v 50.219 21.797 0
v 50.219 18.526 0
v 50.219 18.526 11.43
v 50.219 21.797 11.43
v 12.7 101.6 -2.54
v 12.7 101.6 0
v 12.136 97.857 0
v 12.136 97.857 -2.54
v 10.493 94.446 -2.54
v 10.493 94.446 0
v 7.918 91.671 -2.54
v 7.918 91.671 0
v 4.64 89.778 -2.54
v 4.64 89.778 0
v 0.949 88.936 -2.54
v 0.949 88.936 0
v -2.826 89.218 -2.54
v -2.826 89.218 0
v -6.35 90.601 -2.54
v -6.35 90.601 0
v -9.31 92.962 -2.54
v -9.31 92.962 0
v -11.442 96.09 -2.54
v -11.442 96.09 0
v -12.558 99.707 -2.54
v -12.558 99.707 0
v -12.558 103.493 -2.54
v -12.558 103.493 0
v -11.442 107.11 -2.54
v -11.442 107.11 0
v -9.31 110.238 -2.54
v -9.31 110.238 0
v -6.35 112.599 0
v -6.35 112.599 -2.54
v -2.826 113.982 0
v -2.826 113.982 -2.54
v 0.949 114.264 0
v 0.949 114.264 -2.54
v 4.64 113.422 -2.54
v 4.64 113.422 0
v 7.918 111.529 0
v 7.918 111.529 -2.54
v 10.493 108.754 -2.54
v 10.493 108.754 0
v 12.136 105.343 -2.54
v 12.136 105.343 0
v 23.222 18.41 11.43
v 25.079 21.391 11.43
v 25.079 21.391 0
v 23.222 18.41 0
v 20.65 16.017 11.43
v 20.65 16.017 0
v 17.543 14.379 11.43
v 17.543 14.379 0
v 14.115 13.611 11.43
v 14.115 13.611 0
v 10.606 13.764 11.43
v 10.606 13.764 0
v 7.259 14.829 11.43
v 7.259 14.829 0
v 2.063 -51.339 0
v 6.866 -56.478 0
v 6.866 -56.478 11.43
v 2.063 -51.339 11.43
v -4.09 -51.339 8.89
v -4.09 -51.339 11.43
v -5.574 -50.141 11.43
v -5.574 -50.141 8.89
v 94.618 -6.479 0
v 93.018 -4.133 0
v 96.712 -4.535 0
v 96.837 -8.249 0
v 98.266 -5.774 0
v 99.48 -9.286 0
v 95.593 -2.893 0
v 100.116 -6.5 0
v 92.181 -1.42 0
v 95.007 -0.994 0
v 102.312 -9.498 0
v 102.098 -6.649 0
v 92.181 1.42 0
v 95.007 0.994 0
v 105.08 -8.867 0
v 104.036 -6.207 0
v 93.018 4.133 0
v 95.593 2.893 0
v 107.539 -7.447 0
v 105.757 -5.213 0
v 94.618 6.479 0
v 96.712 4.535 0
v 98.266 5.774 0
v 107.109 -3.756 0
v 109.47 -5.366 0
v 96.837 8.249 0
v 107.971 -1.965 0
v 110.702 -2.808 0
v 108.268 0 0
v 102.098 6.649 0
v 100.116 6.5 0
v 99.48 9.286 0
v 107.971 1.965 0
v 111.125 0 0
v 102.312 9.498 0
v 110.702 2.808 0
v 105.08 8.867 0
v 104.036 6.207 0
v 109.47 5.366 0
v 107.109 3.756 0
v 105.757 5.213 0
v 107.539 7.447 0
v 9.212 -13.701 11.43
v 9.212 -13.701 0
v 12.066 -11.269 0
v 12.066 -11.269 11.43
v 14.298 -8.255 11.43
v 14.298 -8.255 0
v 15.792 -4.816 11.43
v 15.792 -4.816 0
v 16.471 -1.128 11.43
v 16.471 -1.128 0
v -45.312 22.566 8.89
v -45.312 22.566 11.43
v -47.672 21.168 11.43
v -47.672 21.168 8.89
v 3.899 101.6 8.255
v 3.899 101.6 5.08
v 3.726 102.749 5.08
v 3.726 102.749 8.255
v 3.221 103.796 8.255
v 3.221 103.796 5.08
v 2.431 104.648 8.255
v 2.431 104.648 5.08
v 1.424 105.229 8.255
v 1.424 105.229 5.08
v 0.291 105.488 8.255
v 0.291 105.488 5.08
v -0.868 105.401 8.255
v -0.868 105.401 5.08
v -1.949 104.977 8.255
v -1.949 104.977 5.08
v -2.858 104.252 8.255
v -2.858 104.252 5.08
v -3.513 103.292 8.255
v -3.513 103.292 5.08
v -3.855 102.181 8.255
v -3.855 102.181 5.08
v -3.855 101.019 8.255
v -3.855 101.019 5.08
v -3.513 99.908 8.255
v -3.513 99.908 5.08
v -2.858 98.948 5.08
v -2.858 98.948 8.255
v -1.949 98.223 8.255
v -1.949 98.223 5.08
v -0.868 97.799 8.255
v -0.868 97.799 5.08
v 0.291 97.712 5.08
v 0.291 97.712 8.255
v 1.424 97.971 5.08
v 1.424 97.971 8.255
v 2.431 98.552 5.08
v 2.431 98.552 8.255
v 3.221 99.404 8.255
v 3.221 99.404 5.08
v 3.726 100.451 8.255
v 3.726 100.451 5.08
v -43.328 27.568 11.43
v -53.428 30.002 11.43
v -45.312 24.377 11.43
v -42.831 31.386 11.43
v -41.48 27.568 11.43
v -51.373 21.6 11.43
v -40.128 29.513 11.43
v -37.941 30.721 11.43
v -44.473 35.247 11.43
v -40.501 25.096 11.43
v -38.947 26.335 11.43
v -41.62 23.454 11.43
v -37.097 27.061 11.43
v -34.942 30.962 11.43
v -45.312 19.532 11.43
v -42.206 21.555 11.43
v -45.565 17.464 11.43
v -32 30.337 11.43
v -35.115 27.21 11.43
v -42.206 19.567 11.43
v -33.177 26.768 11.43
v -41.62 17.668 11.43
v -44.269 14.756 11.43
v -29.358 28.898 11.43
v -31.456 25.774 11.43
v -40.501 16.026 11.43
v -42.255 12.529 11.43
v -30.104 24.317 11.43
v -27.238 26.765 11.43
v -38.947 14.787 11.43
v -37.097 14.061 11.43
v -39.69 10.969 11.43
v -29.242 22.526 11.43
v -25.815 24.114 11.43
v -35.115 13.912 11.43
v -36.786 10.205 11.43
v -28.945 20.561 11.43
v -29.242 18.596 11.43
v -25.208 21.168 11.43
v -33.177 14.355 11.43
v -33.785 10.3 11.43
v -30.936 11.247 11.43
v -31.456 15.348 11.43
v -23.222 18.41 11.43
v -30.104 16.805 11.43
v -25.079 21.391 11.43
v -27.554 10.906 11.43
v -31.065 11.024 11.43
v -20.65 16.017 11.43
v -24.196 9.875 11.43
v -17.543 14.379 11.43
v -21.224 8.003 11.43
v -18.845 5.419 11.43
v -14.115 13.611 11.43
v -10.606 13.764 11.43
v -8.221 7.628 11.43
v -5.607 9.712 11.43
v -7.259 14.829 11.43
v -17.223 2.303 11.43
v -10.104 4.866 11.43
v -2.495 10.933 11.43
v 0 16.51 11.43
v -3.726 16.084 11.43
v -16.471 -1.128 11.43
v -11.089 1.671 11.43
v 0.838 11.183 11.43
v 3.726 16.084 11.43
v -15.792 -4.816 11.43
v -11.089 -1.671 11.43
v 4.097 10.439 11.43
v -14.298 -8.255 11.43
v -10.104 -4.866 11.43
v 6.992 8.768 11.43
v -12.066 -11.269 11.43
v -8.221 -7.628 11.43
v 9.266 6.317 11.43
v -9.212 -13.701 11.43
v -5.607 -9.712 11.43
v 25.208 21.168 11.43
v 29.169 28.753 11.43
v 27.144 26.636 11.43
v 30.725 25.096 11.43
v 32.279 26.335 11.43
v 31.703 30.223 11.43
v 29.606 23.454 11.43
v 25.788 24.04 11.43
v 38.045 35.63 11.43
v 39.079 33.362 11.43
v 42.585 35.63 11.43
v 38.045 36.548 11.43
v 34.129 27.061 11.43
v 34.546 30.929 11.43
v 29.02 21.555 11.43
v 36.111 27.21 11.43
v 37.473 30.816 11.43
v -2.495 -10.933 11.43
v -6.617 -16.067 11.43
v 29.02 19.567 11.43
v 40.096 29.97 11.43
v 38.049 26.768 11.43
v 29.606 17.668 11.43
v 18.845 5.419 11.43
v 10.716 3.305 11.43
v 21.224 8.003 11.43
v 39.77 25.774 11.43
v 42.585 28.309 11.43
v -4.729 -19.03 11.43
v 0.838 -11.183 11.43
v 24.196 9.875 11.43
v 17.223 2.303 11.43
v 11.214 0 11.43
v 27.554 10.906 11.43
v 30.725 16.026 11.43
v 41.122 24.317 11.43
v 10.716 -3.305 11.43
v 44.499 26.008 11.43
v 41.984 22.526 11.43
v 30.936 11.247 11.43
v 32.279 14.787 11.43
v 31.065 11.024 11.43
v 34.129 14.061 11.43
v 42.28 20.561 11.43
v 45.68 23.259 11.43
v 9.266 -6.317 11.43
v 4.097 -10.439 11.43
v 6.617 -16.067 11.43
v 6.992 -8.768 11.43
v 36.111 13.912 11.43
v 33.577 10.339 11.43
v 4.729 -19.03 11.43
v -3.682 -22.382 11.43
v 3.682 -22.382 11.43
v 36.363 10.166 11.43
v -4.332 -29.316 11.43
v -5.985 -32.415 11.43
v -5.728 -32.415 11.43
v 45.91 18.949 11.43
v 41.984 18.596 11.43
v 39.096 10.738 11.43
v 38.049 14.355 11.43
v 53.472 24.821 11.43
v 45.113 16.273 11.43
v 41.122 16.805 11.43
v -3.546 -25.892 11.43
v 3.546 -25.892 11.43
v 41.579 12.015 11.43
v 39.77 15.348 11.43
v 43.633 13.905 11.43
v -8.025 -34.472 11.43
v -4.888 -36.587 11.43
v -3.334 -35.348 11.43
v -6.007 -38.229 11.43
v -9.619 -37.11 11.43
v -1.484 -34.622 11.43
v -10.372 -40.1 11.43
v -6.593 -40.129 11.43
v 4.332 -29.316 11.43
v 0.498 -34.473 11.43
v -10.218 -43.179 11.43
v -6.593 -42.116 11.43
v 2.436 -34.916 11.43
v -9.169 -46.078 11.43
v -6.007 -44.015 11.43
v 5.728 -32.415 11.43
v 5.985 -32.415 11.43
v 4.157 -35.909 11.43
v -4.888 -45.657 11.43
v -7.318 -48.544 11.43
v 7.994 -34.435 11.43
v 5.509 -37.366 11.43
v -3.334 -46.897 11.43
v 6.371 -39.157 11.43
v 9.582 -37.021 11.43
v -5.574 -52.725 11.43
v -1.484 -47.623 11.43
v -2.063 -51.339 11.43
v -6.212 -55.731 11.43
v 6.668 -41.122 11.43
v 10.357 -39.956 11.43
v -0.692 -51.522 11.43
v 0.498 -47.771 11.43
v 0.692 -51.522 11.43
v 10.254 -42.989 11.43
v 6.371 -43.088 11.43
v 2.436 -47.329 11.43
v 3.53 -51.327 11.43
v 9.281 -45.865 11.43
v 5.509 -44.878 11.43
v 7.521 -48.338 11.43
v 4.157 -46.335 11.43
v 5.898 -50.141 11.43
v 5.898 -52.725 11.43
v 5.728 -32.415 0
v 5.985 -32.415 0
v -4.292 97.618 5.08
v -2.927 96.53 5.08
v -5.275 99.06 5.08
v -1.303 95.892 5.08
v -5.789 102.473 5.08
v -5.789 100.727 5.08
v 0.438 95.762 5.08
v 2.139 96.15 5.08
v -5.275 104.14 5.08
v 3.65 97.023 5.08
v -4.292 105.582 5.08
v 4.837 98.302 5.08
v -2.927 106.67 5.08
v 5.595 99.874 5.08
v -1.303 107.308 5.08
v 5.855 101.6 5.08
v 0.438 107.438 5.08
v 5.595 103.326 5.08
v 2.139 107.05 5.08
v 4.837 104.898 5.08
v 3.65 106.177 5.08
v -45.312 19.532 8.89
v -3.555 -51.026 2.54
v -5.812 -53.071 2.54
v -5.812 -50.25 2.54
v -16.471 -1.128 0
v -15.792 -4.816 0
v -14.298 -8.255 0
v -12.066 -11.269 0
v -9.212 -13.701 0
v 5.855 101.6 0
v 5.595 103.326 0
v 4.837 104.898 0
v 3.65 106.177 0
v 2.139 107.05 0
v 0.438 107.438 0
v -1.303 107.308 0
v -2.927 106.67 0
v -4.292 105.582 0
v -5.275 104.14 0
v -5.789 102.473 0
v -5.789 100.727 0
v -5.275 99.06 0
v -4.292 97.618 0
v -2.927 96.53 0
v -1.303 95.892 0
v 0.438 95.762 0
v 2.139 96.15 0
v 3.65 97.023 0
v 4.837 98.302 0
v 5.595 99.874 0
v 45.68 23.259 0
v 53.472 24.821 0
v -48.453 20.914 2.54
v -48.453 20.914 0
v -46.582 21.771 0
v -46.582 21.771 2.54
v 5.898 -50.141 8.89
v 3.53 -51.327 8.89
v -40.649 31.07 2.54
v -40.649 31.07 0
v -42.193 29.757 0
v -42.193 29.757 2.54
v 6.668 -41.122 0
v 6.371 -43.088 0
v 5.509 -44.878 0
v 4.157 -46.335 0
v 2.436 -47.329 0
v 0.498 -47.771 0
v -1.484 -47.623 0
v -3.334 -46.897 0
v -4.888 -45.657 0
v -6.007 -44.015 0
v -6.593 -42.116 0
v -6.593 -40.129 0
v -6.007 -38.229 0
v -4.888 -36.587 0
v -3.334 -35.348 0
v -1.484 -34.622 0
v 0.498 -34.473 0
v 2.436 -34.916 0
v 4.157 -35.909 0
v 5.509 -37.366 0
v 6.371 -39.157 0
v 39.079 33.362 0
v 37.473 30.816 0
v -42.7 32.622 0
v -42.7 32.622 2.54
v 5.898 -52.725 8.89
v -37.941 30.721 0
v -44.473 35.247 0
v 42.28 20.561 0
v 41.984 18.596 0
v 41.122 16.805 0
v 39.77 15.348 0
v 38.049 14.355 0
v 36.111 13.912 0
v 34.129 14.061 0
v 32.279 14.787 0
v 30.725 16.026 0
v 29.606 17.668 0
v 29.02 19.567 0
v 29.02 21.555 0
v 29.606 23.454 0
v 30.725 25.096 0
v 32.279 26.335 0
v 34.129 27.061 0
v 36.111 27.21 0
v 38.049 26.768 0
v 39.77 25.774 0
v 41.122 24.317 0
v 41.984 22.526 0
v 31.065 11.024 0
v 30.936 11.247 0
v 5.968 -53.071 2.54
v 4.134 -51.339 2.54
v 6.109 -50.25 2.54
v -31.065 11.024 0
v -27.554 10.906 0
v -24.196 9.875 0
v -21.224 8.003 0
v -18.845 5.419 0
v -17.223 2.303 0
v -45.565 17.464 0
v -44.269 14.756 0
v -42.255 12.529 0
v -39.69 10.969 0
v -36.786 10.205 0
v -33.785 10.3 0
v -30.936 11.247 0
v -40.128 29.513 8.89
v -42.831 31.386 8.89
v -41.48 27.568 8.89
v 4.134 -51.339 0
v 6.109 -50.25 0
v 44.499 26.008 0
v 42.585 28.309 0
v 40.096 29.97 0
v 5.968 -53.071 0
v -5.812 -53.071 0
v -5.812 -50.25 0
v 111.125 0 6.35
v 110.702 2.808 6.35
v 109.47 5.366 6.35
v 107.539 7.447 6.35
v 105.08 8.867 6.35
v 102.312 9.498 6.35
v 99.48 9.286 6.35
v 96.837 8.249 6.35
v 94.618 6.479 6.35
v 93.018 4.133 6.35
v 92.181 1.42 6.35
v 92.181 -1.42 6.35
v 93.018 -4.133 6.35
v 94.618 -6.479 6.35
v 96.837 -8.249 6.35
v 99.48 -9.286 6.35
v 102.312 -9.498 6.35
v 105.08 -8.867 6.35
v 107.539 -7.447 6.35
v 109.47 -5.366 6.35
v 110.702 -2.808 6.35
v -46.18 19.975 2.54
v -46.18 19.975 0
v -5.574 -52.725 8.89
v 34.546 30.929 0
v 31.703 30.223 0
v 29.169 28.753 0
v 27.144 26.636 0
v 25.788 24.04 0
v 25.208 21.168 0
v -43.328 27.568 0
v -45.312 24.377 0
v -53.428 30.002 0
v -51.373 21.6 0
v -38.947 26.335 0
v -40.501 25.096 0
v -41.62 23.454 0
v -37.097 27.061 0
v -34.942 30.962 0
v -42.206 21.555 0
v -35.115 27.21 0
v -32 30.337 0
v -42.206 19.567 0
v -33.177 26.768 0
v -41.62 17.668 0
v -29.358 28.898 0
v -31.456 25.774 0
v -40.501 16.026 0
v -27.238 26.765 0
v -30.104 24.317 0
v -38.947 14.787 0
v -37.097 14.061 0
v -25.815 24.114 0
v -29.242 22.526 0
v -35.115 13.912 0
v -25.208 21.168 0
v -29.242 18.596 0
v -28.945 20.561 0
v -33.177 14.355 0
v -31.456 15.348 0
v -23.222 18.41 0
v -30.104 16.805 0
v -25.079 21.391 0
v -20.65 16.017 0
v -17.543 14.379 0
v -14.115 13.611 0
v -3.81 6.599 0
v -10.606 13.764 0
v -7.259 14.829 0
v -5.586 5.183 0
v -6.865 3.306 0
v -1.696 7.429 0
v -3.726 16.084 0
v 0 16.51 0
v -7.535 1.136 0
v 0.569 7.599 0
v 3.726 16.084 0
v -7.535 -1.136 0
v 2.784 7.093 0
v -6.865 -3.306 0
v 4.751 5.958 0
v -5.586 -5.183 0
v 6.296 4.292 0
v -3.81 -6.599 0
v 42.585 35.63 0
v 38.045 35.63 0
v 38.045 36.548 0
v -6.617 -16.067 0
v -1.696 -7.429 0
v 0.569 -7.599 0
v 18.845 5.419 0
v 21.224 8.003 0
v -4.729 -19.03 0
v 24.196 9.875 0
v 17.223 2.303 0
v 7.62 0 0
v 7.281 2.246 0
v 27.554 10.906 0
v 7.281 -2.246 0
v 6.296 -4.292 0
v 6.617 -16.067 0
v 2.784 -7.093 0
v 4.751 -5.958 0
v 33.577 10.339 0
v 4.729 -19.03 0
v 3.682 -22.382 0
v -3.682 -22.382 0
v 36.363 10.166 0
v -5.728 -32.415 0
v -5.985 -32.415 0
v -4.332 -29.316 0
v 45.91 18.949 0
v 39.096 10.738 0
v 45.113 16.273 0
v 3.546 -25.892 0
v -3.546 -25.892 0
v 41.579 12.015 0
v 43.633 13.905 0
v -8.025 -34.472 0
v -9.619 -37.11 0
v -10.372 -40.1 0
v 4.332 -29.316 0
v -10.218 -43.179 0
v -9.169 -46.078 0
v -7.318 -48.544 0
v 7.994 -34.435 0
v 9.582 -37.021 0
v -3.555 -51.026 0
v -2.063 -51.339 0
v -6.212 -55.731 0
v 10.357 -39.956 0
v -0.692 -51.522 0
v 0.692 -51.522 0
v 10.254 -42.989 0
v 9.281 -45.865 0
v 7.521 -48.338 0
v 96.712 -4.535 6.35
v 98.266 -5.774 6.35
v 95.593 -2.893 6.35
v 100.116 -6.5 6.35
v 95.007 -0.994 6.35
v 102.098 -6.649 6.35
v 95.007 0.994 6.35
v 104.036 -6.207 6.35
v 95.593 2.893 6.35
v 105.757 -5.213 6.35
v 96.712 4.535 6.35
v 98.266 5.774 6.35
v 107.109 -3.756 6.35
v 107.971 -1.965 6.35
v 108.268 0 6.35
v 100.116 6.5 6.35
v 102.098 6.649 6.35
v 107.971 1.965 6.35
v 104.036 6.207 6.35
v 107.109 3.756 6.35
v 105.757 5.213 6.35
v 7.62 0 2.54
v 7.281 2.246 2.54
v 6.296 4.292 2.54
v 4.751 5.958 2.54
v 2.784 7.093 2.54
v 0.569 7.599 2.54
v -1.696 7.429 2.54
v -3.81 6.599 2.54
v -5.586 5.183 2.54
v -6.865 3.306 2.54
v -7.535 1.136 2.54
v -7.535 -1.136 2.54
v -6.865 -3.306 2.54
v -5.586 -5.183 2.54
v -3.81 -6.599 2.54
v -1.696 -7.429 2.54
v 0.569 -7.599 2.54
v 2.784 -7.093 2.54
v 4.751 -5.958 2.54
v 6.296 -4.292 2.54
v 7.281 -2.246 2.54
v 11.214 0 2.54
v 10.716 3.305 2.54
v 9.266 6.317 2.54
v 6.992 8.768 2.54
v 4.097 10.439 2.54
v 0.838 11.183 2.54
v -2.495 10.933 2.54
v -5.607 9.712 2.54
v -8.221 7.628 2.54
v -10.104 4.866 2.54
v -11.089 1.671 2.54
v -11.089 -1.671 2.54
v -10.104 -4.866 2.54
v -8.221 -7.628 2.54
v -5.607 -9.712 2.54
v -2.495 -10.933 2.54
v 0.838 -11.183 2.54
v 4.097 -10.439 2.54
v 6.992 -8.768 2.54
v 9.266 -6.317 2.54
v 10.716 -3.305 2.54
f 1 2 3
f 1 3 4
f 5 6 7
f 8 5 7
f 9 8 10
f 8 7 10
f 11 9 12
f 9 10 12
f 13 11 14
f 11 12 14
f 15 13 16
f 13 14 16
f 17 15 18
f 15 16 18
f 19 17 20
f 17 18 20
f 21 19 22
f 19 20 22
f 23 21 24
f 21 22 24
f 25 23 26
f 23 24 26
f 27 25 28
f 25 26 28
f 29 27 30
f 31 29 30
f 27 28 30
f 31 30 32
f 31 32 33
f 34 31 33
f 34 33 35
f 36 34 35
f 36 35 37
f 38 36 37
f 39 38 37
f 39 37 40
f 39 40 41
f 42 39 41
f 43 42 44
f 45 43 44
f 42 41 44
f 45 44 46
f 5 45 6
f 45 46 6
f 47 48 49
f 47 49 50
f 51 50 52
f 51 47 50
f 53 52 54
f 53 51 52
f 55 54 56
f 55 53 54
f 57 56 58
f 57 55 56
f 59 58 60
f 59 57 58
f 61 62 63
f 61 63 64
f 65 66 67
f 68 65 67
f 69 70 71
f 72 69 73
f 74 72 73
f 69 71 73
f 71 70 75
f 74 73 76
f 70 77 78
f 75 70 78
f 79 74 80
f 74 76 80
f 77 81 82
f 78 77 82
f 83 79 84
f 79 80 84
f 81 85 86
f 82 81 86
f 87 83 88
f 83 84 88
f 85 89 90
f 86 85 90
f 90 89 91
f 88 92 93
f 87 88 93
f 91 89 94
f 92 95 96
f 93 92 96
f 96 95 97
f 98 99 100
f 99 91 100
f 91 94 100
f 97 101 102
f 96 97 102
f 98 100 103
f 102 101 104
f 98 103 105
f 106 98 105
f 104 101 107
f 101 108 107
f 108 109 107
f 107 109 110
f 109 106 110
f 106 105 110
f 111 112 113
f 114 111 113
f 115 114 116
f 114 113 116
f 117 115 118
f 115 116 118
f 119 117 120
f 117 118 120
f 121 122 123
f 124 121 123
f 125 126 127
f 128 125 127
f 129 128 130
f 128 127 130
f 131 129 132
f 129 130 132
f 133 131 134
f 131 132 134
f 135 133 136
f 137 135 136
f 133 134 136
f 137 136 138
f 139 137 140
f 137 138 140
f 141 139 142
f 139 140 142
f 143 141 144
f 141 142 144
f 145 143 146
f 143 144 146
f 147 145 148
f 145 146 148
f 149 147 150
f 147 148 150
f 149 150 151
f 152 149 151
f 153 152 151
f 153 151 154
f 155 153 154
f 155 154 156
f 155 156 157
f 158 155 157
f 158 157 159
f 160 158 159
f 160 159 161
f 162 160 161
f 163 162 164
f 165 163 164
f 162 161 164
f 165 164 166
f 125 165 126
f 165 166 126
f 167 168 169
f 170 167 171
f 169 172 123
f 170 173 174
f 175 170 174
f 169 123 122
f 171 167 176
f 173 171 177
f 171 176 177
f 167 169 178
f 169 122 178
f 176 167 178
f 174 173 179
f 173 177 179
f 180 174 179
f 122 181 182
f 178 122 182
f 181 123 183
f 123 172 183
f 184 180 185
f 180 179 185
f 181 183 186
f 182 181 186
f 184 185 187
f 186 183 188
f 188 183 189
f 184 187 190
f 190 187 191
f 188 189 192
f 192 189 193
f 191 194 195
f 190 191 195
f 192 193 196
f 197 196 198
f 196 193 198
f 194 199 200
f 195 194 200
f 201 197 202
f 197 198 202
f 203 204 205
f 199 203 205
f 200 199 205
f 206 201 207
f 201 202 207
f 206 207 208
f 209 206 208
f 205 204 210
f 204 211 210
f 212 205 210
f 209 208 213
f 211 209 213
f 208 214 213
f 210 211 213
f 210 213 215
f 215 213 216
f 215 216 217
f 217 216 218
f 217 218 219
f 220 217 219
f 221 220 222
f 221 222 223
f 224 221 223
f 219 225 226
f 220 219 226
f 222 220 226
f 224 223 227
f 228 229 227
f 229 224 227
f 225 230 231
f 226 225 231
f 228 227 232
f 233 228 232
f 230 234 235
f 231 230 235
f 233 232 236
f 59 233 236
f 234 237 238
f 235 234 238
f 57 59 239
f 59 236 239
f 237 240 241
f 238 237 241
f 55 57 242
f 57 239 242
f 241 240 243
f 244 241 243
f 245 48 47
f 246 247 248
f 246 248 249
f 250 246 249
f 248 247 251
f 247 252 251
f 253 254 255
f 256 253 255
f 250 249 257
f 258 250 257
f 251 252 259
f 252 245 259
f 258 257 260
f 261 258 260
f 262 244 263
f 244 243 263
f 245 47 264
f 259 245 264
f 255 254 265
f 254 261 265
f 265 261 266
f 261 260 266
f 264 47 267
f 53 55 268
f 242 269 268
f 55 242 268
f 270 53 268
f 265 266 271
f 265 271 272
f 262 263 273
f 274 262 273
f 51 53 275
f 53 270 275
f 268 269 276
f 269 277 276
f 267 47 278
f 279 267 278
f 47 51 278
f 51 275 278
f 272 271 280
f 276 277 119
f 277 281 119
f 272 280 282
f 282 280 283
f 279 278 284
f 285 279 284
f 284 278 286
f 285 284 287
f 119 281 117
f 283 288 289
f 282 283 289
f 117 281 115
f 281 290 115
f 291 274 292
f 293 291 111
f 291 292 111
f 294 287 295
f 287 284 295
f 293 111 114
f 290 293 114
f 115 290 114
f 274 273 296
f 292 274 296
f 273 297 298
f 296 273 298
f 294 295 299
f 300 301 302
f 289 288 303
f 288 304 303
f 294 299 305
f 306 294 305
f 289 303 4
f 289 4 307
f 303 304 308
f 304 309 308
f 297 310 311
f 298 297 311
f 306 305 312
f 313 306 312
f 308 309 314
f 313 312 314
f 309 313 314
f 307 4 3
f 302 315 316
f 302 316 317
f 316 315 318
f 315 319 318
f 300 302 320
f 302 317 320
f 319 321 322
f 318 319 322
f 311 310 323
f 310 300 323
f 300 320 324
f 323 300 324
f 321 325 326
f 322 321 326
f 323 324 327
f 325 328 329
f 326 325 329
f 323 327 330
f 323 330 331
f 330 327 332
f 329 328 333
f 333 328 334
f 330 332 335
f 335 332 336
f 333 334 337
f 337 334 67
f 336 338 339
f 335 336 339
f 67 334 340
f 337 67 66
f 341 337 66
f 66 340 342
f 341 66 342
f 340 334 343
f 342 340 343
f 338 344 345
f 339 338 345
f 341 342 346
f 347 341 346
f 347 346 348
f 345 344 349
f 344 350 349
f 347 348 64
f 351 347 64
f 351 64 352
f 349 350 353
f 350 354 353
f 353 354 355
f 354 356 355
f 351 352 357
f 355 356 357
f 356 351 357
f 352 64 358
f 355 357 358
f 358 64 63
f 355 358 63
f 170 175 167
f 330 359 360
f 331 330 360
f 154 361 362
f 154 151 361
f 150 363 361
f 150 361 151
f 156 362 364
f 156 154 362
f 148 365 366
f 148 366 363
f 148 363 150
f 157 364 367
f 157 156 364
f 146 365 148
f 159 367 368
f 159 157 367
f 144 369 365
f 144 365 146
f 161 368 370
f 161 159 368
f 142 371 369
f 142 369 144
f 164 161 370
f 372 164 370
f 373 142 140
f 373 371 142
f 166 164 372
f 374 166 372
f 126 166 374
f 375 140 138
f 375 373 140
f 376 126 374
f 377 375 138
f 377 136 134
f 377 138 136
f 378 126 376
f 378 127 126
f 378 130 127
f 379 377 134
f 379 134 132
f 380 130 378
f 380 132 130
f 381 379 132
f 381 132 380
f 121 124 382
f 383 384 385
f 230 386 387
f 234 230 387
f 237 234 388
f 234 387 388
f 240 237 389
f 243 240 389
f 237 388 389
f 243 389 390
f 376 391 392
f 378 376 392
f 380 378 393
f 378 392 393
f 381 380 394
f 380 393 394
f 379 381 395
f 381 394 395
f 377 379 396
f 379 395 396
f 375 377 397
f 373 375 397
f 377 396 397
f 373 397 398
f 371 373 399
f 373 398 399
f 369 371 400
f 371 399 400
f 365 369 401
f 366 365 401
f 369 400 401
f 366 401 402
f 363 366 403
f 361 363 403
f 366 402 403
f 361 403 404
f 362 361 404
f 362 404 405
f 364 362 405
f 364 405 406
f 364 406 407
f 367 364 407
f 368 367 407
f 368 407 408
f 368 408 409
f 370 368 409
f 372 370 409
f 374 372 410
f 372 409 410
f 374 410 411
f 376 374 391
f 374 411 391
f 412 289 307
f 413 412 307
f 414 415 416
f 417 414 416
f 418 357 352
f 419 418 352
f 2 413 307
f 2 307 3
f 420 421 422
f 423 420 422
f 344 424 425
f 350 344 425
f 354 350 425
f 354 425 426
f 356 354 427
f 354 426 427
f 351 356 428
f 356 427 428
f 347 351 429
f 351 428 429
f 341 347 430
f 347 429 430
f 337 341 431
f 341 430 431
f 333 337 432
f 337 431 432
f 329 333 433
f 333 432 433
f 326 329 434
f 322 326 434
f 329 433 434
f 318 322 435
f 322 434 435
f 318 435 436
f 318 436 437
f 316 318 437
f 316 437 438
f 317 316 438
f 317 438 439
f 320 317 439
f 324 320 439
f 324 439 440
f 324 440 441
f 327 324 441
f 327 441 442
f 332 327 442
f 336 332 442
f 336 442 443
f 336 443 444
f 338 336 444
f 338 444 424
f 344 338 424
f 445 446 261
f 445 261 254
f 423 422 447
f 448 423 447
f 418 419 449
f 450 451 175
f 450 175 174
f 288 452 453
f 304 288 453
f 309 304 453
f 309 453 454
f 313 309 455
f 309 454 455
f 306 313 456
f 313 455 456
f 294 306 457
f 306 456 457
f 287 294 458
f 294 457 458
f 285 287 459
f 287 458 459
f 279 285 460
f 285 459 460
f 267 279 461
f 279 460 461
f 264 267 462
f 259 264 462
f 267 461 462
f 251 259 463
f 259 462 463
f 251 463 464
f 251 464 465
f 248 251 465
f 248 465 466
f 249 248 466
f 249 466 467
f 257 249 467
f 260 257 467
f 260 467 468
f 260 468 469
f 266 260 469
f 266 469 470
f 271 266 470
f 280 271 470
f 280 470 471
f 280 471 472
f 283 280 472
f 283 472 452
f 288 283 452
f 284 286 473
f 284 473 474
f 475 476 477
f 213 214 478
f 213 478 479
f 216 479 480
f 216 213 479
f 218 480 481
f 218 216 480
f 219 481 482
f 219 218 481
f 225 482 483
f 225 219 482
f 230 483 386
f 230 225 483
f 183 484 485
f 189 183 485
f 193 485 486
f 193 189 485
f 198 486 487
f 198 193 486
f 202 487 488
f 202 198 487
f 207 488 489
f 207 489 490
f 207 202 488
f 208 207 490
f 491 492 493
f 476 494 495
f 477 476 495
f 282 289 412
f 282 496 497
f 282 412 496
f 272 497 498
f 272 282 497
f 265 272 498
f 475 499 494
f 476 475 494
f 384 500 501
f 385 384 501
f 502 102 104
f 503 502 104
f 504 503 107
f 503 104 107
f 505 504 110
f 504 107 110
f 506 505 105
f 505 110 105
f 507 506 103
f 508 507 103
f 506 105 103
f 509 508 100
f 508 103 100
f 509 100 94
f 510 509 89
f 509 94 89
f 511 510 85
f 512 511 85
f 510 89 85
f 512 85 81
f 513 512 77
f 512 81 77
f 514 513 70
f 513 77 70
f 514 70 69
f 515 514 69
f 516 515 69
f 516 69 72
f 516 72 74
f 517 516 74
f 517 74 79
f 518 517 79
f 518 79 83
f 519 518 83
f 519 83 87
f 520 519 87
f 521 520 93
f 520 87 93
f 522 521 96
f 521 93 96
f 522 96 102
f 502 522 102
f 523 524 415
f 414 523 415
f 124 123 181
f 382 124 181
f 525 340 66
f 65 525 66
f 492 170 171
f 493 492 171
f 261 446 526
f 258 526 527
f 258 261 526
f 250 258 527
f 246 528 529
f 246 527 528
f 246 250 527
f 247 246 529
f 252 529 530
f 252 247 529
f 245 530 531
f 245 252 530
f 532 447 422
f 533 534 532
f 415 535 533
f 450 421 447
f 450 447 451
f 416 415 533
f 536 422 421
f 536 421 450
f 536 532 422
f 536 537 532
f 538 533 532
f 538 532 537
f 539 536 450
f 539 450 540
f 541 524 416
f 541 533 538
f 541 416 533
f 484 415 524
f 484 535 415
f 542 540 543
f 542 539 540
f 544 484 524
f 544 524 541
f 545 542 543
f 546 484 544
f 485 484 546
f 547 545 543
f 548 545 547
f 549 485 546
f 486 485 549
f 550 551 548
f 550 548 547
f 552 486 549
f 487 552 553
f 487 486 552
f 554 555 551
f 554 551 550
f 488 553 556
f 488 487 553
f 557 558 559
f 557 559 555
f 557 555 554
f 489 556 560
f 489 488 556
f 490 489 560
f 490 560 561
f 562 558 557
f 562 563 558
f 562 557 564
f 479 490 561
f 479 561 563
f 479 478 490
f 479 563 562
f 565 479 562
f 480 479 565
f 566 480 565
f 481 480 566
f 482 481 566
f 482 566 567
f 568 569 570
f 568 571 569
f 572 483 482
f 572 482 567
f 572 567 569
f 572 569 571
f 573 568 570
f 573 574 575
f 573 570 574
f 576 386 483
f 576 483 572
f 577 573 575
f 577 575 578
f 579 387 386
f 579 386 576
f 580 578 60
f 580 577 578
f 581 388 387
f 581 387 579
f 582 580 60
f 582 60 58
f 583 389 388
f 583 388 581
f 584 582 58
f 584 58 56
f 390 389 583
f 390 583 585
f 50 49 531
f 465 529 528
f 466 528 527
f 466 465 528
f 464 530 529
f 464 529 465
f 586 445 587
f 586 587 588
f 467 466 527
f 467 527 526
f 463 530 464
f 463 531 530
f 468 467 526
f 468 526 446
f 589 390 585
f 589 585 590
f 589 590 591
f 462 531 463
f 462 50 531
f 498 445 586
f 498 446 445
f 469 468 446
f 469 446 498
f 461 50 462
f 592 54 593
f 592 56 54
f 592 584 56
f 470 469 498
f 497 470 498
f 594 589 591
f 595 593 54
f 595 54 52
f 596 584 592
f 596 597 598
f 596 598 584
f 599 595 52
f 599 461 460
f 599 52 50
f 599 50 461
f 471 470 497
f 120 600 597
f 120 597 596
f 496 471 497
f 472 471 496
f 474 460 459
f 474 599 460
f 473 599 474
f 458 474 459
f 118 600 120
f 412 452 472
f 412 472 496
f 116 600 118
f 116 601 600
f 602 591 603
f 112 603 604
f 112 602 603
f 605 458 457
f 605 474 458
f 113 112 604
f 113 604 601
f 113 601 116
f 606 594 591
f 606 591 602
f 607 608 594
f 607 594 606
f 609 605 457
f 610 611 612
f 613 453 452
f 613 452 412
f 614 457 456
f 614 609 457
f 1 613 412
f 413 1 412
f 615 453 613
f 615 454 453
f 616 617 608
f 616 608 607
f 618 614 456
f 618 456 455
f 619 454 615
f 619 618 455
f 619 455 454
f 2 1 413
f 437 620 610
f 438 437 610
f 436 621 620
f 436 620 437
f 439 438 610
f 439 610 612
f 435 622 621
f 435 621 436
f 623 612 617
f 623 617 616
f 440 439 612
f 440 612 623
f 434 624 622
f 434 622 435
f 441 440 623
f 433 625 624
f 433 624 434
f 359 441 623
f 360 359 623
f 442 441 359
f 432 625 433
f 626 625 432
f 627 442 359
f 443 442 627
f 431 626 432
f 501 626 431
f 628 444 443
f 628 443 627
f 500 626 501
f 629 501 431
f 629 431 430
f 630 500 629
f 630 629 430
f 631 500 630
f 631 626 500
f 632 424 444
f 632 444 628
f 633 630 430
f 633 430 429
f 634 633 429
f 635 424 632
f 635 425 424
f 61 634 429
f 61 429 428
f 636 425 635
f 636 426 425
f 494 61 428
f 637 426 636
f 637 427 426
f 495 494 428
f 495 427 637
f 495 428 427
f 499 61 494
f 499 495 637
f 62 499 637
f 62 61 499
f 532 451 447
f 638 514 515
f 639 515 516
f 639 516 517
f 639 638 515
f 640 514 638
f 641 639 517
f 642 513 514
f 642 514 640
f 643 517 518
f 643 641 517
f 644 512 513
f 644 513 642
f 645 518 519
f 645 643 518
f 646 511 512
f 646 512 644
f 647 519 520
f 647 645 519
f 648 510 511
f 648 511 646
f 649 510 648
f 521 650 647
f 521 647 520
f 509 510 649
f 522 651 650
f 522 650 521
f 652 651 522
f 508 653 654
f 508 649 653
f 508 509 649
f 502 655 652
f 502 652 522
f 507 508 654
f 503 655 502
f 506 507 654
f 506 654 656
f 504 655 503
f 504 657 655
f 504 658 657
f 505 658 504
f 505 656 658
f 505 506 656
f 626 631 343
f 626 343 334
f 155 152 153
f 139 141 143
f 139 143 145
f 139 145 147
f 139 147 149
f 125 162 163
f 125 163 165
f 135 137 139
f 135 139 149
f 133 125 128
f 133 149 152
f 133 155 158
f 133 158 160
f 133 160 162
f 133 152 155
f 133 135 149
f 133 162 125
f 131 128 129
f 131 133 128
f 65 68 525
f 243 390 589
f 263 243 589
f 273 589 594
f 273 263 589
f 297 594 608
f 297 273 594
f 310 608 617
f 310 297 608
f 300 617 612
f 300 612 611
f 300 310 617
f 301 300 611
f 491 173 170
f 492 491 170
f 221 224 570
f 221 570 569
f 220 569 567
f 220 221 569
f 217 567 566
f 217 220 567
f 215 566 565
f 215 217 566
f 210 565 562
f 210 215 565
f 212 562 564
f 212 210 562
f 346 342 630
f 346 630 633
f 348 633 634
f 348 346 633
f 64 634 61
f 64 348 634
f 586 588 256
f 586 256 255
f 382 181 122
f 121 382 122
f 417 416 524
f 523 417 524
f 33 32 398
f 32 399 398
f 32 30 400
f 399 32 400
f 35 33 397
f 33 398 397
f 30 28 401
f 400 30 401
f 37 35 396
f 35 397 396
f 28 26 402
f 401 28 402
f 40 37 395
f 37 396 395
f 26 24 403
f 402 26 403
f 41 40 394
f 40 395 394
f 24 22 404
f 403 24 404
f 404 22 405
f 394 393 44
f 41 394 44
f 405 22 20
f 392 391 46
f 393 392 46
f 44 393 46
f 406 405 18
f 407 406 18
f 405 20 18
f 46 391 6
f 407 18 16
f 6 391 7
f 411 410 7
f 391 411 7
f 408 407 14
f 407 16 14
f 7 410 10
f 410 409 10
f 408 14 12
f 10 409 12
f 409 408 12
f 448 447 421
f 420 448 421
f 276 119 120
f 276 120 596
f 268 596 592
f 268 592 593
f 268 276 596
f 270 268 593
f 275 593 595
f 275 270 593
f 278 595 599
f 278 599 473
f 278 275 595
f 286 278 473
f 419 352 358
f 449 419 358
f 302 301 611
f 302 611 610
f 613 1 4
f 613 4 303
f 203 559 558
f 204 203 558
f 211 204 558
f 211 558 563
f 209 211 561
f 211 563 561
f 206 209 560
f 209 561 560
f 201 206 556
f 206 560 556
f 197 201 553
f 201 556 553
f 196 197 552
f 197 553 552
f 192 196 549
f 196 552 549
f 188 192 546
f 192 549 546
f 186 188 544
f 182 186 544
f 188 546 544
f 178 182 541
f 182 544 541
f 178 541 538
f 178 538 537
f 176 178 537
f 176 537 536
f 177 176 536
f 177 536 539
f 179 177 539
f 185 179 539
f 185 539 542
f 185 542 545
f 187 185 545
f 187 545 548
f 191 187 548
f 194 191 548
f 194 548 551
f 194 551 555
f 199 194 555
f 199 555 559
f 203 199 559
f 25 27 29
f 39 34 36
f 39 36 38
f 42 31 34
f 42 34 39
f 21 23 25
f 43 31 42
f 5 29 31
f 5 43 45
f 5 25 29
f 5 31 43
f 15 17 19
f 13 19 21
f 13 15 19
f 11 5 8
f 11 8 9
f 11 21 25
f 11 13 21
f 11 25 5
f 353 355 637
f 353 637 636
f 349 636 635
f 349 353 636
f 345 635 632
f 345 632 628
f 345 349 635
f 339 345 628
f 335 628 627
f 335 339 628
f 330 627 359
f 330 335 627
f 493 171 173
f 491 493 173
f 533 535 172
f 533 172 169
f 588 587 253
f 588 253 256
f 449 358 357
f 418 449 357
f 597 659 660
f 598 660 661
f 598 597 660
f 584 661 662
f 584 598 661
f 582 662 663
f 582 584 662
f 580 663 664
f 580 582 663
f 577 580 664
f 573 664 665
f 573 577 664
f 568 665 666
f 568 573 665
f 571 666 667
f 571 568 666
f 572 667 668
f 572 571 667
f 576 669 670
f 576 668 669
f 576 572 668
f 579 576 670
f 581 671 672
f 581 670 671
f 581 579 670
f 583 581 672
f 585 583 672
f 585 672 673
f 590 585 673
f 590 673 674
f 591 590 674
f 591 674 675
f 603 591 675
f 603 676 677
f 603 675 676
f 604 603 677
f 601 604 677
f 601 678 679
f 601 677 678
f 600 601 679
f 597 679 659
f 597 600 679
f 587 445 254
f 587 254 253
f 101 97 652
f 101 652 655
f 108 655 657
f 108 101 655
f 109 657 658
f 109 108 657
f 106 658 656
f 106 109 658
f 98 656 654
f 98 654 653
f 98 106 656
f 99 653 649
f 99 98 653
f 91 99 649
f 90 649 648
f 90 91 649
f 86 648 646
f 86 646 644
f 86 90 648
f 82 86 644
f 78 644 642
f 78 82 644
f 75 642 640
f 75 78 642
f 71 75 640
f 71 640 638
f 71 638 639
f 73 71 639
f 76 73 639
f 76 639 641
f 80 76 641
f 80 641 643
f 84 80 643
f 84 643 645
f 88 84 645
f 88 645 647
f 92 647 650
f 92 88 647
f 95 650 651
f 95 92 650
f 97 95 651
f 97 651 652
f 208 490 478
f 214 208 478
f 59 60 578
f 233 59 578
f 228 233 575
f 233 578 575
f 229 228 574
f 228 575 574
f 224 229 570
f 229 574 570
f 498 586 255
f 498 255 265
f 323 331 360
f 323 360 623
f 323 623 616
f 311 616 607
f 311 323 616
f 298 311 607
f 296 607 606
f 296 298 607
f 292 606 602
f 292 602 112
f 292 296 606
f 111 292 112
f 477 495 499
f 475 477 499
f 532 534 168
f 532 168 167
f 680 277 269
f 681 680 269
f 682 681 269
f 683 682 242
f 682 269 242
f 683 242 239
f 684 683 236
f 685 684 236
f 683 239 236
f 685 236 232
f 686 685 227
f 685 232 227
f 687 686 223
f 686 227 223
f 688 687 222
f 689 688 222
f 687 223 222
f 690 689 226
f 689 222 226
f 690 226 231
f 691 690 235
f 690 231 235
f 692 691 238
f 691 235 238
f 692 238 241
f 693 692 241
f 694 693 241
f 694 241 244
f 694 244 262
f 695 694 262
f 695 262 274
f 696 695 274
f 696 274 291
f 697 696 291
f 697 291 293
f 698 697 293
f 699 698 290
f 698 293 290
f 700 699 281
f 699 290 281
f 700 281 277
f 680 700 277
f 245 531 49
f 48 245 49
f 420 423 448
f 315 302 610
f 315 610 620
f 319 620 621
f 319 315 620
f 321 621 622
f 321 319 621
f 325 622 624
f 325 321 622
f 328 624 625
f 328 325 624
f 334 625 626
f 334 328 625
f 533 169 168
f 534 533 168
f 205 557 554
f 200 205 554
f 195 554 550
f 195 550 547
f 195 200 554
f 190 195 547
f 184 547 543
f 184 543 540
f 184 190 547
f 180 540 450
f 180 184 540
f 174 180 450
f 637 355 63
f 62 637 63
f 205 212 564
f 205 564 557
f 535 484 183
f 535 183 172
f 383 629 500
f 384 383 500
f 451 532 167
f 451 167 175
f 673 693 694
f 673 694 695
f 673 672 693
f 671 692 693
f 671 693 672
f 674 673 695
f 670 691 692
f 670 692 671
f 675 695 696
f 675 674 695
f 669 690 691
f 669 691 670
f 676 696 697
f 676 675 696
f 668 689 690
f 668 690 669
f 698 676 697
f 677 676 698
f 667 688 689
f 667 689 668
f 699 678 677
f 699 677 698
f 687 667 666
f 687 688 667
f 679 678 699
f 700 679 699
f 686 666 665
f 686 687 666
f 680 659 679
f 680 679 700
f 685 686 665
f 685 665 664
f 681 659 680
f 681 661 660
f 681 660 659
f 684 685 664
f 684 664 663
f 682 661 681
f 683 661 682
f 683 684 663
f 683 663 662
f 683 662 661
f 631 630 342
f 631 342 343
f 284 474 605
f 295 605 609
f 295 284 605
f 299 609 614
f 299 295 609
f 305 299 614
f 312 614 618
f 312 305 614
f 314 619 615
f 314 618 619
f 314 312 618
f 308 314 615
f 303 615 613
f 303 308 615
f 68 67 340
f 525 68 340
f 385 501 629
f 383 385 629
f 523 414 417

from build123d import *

# Parameters (mm, degrees)
F0_R      = 5.8547
F1_DEPTH  = 5.08
F2_R      = 3.8989
F3_DEPTH  = 3.175
F4_R      = 12.7
F5_DEPTH  = 2.54
F6_R      = 9.525
F6_R_2    = 6.6675
F7_DEPTH  = 6.35
F8_R      = 16.51
F8_R_2    = 7.62
F9_DEPTH  = 11.43
F10_R     = 11.2141
F11_DEPTH = 8.89
F13_DEPTH = 11.43
F14_R     = 10.42259
F15_DEPTH = 11.43
F17_DEPTH = 11.43
F19_DEPTH = 11.43
F21_DEPTH = 2.54
F23_DEPTH = 11.43
F25_DEPTH = 2.54
F26_R     = 6.6675
F27_DEPTH = 254
F29_DEPTH = 2.54
F31_DEPTH = 2.54


with BuildPart() as f1:
    # F0 (on Top) → F1 (new body)
    with BuildSketch(Plane.XY):
        with Locations((0, 101.6)):
            Circle(F0_R)
    extrude(amount=F1_DEPTH)

    # F2 (on face) → F3 (join)
    with BuildSketch(Plane.XY.offset(5.08)):
        with Locations((0, 101.6)):
            Circle(F2_R)
    extrude(amount=F3_DEPTH)

    # F4 (on face) → F5 (join)
    with BuildSketch(Plane(origin=(0, 0, 0), x_dir=(1, 0, 0), z_dir=(0, 0, -1))):
        with Locations((0, -101.6)):
            Circle(F4_R)
    extrude(amount=F5_DEPTH)


with BuildPart() as f7:
    # F6 (on Top) → F7 (new body)
    with BuildSketch(Plane.XY):
        with Locations((101.6, 0)):
            Circle(F6_R)
        with Locations((101.6, 0)):
            Circle(F6_R_2, mode=Mode.SUBTRACT)
    extrude(amount=F7_DEPTH)


with BuildPart() as f9:
    # F8 (on Top) → F9 (new body)
    with BuildSketch(Plane.XY):
        Circle(F8_R)
        Circle(F8_R_2, mode=Mode.SUBTRACT)
    extrude(amount=F9_DEPTH)

    # F10 (on face) → F11 (cut)
    with BuildSketch(Plane.XY.offset(11.43)):
        Circle(F10_R)
    extrude(amount=-F11_DEPTH, mode=Mode.SUBTRACT)

    # F12 (on face) → F13 (join)
    with BuildSketch(Plane.XY.offset(11.43)):
        with BuildLine():
            ThreePointArc((5.98536, -32.414889), (3.68152, -22.382304), (9.212453, -13.700759))
            Line((9.212453, -13.700759), (-9.212453, -13.700759))
            ThreePointArc((-9.212453, -13.700759), (-3.68152, -22.382304), (-5.98536, -32.414889))
            Line((-5.98536, -32.414889), (5.98536, -32.414889))
        make_face()
        with BuildLine():
            ThreePointArc((25.079437, 21.390918), (17.542884, 14.379441), (7.258979, 14.828598))
            Line((7.258979, 14.828598), (16.471432, -1.127839))
            ThreePointArc((16.471432, -1.127839), (21.224403, 8.002862), (31.064797, 11.023971))
            Line((31.064797, 11.023971), (25.079437, 21.390918))
        make_face()
        with BuildLine():
            ThreePointArc((-31.064797, 11.023971), (-21.224403, 8.002862), (-16.471432, -1.127839))
            Line((-16.471432, -1.127839), (-7.258979, 14.828598))
            ThreePointArc((-7.258979, 14.828598), (-17.542884, 14.379441), (-25.079437, 21.390918))
            Line((-25.079437, 21.390918), (-31.064797, 11.023971))
        make_face()
    extrude(amount=-F13_DEPTH)

    # F14 (on face) → F15 (join)
    with BuildSketch(Plane.XY.offset(11.43)):
        with Locations((0, -41.122314)):
            Circle(F14_R)
        with Locations((35.612968, 20.561157)):
            Circle(F14_R)
        with Locations((-35.612968, 20.561157)):
            Circle(F14_R)
    extrude(amount=-F15_DEPTH)

    # F16 (on face) → F17 (join)
    with BuildSketch(Plane(origin=(0, 0, 0), x_dir=(1, 0, 0), z_dir=(0, 0, -1))):
        Polygon((-6.212419, 55.731084), (-7.317794, 48.543923), (7.521274, 48.337632), (6.865877, 56.478415), (2.062512, 51.338792), (-2.062512, 51.338792), align=None)
    extrude(amount=-F17_DEPTH)

    # F18 (on face) → F19 (join)
    with BuildSketch(Plane(origin=(0, 0, 0), x_dir=(1, 0, 0), z_dir=(0, 0, -1))):
        Polygon((-44.473318, -35.247321), (-37.940599, -30.720513), (-45.564884, -17.464423), (-51.372606, -21.600267), (-45.311758, -24.37742), (-53.428173, -30.00164), (-43.328464, -27.568404), align=None)
    extrude(amount=-F19_DEPTH)

    # F20 (on face) → F21 (cut)
    with BuildSketch(Plane(origin=(0, 0, 0), x_dir=(1, 0, 0), z_dir=(0, 0, -1))):
        Polygon((-42.699587, -32.62233), (-40.649235, -31.070197), (-42.19266, -29.756567), align=None)
        Polygon((-48.453345, -20.913697), (-46.58173, -21.771293), (-46.179816, -19.975295), align=None)
    extrude(amount=-F21_DEPTH, mode=Mode.SUBTRACT)

    # F22 (on face) → F23 (join)
    with BuildSketch(Plane(origin=(0, 0, 0), x_dir=(1, 0, 0), z_dir=(0, 0, -1))):
        Polygon((50.218709, -21.79723), (45.910077, -18.948722), (43.793466, -18.524475), (35.480846, -26.646961), (35.480846, -27.657114), (39.078787, -33.36205), (38.04455, -35.630021), (38.04455, -36.547828), (42.585161, -35.630021), (39.078787, -27.657114), (43.793466, -22.880767), (53.471625, -24.820628), (50.218709, -18.525613), align=None)
    extrude(amount=-F23_DEPTH)

    # F24 (on face) → F25 (cut)
    with BuildSketch(Plane(origin=(0, 0, 0), x_dir=(1, 0, 0), z_dir=(0, 0, -1))):
        Polygon((-5.811757, 53.071145), (-5.811757, 50.249595), (-3.554519, 51.025521), align=None)
        Polygon((6.109278, 50.249595), (5.9682, 53.071145), (4.134195, 51.338792), align=None)
    extrude(amount=-F25_DEPTH, mode=Mode.SUBTRACT)

    # F26 (on face) → F27 (cut)
    with BuildSketch(Plane(origin=(0, 0, 0), x_dir=(1, 0, 0), z_dir=(0, 0, -1))):
        with Locations((0, 41.122314)):
            Circle(F26_R)
        with Locations((-35.612968, -20.561157)):
            Circle(F26_R)
        with Locations((35.612968, -20.561157)):
            Circle(F26_R)
    extrude(amount=-F27_DEPTH, mode=Mode.SUBTRACT)

    # F28 (on face) → F29 (cut)
    with BuildSketch(Plane.XY.offset(11.43)):
        Polygon((3.530147, -51.327299), (5.898153, -52.725405), (5.898153, -50.14094), align=None)
        Polygon((-5.573871, -52.725405), (-4.090189, -51.338792), (-5.573871, -50.14094), align=None)
    extrude(amount=-F29_DEPTH, mode=Mode.SUBTRACT)

    # F30 (on face) → F31 (cut)
    with BuildSketch(Plane.XY.offset(11.43)):
        Polygon((-41.479527, 27.568404), (-40.128153, 29.513068), (-42.830901, 31.385921), align=None)
        Polygon((-47.672383, 21.168125), (-45.311758, 19.532345), (-45.311758, 21.168125), (-45.311758, 22.566194), align=None)
    extrude(amount=-F31_DEPTH, mode=Mode.SUBTRACT)


solid = Compound([f1.part, f7.part, f9.part])
